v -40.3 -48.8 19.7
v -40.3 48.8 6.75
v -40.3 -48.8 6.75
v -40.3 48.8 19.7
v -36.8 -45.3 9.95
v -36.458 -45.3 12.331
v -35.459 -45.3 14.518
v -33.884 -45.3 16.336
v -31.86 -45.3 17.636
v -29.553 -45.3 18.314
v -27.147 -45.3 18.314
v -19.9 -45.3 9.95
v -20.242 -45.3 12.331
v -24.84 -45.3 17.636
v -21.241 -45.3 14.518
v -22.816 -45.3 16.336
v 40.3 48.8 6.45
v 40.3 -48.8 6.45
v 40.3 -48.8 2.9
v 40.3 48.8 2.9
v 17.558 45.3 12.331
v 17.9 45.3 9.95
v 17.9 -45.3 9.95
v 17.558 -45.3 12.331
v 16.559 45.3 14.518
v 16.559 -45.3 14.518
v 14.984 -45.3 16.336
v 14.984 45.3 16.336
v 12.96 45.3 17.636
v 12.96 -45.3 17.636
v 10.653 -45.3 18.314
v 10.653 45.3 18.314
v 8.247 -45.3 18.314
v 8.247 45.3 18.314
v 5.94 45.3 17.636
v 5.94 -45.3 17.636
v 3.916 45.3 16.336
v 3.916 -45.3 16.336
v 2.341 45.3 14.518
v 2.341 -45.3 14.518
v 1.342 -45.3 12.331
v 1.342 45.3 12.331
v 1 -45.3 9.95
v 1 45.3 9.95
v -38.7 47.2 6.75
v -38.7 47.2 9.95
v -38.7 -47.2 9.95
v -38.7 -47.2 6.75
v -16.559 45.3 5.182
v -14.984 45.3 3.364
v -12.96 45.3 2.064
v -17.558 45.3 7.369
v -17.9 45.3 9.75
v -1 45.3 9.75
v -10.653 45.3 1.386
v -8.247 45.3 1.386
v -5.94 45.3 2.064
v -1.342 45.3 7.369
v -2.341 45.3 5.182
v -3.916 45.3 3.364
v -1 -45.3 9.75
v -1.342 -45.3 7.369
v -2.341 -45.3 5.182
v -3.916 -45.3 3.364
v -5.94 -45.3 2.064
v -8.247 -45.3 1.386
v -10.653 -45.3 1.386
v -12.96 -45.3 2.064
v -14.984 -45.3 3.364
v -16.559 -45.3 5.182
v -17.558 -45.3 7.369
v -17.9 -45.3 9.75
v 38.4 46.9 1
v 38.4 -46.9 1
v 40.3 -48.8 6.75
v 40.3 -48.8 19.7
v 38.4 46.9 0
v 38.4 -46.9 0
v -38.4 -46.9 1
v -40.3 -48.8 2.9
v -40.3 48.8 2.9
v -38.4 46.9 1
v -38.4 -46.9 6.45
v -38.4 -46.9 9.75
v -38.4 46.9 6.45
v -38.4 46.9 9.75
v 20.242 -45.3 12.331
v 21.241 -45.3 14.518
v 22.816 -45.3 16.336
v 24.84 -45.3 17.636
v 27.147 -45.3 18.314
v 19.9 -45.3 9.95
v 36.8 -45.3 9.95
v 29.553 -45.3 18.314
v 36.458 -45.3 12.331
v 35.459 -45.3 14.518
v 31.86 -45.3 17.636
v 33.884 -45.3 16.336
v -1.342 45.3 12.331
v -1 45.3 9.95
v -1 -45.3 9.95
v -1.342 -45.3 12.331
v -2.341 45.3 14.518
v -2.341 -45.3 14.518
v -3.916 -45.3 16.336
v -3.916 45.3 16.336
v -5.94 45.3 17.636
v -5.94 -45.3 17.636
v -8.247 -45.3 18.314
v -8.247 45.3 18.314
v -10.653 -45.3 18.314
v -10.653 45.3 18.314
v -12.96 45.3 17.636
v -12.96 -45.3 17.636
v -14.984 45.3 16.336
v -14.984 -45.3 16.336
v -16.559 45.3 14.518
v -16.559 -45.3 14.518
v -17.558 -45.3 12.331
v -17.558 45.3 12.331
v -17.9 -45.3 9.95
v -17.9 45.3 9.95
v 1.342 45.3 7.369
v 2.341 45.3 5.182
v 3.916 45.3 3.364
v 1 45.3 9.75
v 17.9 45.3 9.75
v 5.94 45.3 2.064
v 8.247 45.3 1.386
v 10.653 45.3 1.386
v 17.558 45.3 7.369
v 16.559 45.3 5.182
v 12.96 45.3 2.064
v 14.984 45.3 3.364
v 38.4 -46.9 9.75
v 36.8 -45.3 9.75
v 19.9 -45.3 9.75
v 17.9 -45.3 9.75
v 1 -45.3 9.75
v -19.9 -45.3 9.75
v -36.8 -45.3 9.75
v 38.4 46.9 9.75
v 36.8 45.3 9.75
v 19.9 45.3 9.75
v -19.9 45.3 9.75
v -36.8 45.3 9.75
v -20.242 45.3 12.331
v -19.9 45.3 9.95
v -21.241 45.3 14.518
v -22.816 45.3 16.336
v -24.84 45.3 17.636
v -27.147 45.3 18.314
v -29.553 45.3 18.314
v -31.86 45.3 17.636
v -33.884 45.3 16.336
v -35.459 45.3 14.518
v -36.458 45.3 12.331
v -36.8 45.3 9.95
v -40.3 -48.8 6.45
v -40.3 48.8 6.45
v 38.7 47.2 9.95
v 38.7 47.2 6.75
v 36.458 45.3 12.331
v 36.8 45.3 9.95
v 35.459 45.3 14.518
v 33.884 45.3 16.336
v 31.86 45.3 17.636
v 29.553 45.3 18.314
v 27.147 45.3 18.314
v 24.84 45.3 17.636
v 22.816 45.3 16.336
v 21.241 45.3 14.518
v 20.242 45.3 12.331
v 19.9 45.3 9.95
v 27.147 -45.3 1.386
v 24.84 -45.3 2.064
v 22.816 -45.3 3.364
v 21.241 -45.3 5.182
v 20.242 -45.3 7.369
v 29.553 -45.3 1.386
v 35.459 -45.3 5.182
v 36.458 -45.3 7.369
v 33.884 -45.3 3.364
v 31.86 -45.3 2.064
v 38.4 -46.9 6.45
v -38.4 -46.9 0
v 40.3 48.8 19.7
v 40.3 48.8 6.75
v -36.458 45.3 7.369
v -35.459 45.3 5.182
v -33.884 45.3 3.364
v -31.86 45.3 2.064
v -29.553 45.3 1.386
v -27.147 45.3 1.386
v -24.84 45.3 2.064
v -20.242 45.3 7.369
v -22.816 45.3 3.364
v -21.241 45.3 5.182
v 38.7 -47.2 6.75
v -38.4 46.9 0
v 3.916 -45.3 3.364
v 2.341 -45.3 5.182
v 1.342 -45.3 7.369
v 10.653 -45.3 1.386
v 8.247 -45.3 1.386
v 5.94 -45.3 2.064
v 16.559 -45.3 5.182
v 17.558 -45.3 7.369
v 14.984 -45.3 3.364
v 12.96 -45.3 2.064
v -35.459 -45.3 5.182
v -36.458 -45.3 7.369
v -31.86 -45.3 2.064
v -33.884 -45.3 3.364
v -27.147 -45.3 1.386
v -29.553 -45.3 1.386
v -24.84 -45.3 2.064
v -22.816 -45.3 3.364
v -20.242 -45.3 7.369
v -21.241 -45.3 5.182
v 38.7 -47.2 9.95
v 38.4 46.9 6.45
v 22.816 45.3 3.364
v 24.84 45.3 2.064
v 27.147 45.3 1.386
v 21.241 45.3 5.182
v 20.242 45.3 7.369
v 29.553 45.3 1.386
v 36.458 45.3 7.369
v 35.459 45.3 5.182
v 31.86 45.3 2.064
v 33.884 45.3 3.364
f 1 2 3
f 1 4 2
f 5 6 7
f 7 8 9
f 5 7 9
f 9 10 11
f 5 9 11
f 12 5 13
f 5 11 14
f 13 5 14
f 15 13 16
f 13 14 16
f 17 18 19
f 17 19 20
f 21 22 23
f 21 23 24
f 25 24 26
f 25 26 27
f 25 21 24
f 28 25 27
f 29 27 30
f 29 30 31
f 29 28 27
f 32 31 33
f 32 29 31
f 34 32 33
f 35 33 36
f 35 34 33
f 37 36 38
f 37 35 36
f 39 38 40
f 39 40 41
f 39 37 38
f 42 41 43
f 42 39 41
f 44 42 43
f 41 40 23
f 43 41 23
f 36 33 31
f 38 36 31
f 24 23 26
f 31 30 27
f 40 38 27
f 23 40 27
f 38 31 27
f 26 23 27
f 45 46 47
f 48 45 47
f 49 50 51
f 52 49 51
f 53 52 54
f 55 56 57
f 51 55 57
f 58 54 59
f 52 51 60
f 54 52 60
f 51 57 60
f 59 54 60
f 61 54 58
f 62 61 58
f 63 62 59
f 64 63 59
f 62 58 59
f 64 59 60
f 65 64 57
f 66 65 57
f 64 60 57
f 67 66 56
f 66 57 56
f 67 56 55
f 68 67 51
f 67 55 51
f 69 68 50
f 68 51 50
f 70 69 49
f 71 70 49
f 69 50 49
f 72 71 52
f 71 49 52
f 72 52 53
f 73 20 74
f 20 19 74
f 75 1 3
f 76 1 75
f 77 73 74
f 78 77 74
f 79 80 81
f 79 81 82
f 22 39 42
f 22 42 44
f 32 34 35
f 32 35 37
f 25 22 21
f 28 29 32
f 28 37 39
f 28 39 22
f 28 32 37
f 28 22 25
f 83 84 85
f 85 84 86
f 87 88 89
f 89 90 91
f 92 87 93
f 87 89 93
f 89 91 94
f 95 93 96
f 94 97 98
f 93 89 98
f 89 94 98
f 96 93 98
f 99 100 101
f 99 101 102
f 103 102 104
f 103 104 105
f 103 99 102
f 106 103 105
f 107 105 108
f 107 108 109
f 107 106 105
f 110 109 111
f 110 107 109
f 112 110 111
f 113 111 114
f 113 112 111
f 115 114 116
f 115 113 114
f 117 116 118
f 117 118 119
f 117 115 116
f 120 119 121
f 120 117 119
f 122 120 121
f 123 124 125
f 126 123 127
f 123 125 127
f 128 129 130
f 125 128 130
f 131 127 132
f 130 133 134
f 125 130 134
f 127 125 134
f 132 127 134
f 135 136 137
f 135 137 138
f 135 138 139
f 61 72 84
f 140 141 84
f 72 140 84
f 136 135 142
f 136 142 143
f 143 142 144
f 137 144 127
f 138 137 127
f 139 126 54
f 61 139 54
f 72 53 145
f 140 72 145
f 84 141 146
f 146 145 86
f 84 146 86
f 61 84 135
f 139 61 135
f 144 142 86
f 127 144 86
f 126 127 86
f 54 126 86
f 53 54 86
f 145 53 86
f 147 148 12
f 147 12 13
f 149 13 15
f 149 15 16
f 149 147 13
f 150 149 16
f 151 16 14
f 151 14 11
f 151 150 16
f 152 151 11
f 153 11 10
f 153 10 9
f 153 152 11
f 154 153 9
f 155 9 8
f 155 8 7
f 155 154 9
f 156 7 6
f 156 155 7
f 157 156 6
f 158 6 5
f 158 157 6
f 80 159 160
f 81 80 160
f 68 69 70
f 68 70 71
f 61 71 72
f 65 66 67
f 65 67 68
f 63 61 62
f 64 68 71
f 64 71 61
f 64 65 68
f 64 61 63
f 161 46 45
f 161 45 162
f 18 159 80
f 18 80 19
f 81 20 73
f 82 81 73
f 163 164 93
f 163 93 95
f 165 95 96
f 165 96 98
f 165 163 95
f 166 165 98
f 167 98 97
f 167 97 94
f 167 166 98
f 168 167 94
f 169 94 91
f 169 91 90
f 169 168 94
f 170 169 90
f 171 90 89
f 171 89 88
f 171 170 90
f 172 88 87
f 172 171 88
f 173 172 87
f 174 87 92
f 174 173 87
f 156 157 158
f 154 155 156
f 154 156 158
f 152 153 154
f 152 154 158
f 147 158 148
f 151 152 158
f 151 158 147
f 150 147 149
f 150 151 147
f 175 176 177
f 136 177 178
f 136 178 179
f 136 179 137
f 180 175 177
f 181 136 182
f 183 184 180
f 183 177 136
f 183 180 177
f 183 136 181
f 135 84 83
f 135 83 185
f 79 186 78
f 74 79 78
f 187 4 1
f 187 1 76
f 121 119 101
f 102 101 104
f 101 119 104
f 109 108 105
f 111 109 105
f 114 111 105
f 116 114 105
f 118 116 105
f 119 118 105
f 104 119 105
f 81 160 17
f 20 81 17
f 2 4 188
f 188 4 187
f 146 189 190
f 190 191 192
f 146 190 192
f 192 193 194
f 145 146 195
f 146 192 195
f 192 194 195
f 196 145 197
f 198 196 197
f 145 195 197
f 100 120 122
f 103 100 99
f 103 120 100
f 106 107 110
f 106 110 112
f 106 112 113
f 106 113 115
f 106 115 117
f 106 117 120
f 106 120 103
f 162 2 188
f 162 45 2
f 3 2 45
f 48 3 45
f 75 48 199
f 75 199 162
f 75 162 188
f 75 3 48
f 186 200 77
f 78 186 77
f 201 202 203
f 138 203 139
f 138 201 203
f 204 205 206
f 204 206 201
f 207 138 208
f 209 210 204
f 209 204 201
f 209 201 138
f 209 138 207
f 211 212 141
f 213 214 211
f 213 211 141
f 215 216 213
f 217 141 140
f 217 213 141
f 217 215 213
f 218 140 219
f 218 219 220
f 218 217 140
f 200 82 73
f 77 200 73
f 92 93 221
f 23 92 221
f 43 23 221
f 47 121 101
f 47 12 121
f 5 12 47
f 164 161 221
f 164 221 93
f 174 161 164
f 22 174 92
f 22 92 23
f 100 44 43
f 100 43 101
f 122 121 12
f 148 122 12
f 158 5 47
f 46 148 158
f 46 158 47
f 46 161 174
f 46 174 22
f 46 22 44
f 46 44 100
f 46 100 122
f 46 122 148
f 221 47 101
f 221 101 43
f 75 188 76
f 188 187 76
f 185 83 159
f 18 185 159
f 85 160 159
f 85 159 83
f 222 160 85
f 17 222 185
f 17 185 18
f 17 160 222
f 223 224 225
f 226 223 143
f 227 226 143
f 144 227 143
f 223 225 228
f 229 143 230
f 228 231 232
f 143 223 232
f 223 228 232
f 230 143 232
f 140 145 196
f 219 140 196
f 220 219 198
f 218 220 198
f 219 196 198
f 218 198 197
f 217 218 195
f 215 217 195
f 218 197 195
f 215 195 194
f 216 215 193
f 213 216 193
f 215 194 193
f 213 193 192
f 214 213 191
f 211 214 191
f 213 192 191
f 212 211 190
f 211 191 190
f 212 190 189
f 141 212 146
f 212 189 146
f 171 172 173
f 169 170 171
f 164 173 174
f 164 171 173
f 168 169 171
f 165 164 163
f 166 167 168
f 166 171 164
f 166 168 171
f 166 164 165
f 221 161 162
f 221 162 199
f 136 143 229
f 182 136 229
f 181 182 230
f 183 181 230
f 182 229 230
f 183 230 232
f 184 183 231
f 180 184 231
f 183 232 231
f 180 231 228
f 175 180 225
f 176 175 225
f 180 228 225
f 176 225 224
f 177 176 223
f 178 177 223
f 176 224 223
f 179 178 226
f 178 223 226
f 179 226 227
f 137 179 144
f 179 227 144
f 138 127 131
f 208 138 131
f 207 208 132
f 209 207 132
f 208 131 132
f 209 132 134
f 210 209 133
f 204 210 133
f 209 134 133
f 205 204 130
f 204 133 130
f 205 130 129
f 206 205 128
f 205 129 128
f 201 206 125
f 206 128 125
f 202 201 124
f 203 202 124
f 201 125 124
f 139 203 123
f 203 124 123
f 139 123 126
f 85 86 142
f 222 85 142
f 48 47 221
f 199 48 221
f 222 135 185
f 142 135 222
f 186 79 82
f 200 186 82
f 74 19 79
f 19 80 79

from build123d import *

# Parameters (mm, degrees)
F3_W          = 80.6
F3_H          = 97.6
F4_DEPTH      = 1
F5_W          = 80.6
F5_H          = 97.6
F5_W_2        = 73.6
F5_H_2        = 90.6
F6_DEPTH      = 8.75
F8_DEPTH      = 90.6
F11_W         = 80.6
F11_H         = 97.6
F11_W_2       = 76.8
F11_H_2       = 93.8
F13_DEPTH     = 3.3
F14_W         = 80.6
F14_H         = 97.6
F14_W_2       = 76.8
F14_H_2       = 93.8
F15_DEPTH     = 3
F16_T4_DEPTH  = 76.8
F16_T9_DEPTH  = 93.8
F16_T14_DEPTH = 76.8
F16_T19_DEPTH = 93.8
F16_T25_DEPTH = 81.9433659759
F16_T31_DEPTH = 98.9433659759
F16_T40_DEPTH = 81.9433659759
F16_T46_DEPTH = 98.9433659759
F16_T55_DEPTH = 81.9433659759
F16_T61_DEPTH = 98.9433659759
F16_T70_DEPTH = 98.9433659759
F16_T76_DEPTH = 81.9433659759
F17_W         = 80.6
F17_H         = 97.6
F17_W_2       = 77.4
F17_H_2       = 94.4
F18_DEPTH     = 3.2


# Not quite as in the source:
# - a fillet or chamfer that OpenCascade refuses, or shapes differently, is made with other operations: its cross-section is extruded or revolved along the edge and cut away or added


with BuildPart() as f4:
    # F3 (on Top) → F4 (new body)
    with BuildSketch(Plane.XY):
        Rectangle(F3_W, F3_H)
    extrude(amount=F4_DEPTH)

    # F5 (on face) → F6 (join)
    with BuildSketch(Plane.XY.offset(1)):
        Rectangle(F5_W, F5_H)
        Rectangle(F5_W_2, F5_H_2, mode=Mode.SUBTRACT)
    extrude(amount=F6_DEPTH)

    # F7 (on face) → F8 (join, through all)
    with BuildSketch(Plane.XZ.offset(-45.3)):
        with BuildLine():
            ThreePointArc((-19.9, 9.75), (-28.35, 1.3), (-36.8, 9.75))
            Line((-36.8, 9.75), (-36.8, 1))
            Line((-36.8, 1), (36.8, 1))
            Line((36.8, 1), (36.8, 9.75))
            ThreePointArc((36.8, 9.75), (28.35, 1.3), (19.9, 9.75))
            Line((19.9, 9.75), (17.9, 9.75))
            ThreePointArc((17.9, 9.75), (9.45, 1.3), (1, 9.75))
            Line((1, 9.75), (-1, 9.75))
            ThreePointArc((-1, 9.75), (-9.45, 1.3), (-17.9, 9.75))
            Line((-17.9, 9.75), (-19.9, 9.75))
        make_face()
    extrude(amount=F8_DEPTH)


with BuildPart() as f10_1:
    # F10: instance of F4
    add(f4.part.mirror(Plane.XY.offset(9.85)))

    # F17 (on face) → F18 (join)
    with BuildSketch(Plane(origin=(0, 0, 9.95), x_dir=(1, 0, 0), z_dir=(0, 0, -1))):
        Rectangle(F17_W, F17_H)
        Rectangle(F17_W_2, F17_H_2, mode=Mode.SUBTRACT)
    extrude(amount=F18_DEPTH)


with BuildPart() as f4_1:
    add(f4.part)

    # F11 (on face) → F13 (cut)
    with BuildSketch(Plane.XY.offset(9.75)):
        Rectangle(F11_W, F11_H)
        Rectangle(F11_W_2, F11_H_2, mode=Mode.SUBTRACT)
    extrude(amount=-F13_DEPTH, mode=Mode.SUBTRACT)

    # F14 (on face) → F15 (cut)
    with BuildSketch(Plane(origin=(0, 0, 0), x_dir=(1, 0, 0), z_dir=(0, 0, -1))):
        Rectangle(F14_W, F14_H)
        Rectangle(F14_W_2, F14_H_2, mode=Mode.SUBTRACT)
    extrude(amount=-F15_DEPTH, mode=Mode.SUBTRACT)

    # F16: chamfer of 2 on 4 edges, made by hand


with BuildPart() as f16_tool2:
    # F16_s3 → F16_t4 (new body)
    with BuildSketch(Plane.YZ.offset(-38.4)):
        Polygon((-48.9, 3), (-46.9, 1), (-46.9, 3), align=None)
    extrude(amount=F16_T4_DEPTH)

    split(bisect_by=Plane.XZ.offset(48.8), keep=Keep.BOTTOM)


with BuildPart() as f4_2:
    add(f4_1.part)

    # F16_t1: union F16_tool2
    add(f16_tool2.part)


with BuildPart() as f16_tool7:
    # F16_s8 → F16_t9 (new body)
    with BuildSketch(Plane.XZ.offset(-46.9)):
        Polygon((-40.4, 3), (-38.4, 1), (-38.4, 3), align=None)
    extrude(amount=F16_T9_DEPTH)

    split(bisect_by=Plane.YZ.offset(-40.3), keep=Keep.TOP)


with BuildPart() as f4_3:
    add(f4_2.part)

    # F16_t6: union F16_tool7
    add(f16_tool7.part)


with BuildPart() as f16_tool12:
    # F16_s13 → F16_t14 (new body)
    with BuildSketch(Plane.YZ.offset(38.4)):
        Polygon((48.9, 3), (46.9, 1), (46.9, 3), align=None)
    extrude(amount=-F16_T14_DEPTH)

    split(bisect_by=Plane.XZ.offset(-48.8), keep=Keep.TOP)


with BuildPart() as f4_4:
    add(f4_3.part)

    # F16_t11: union F16_tool12
    add(f16_tool12.part)


with BuildPart() as f16_tool17:
    # F16_s18 → F16_t19 (new body)
    with BuildSketch(Plane.XZ.offset(46.9)):
        Polygon((40.4, 3), (38.4, 1), (38.4, 3), align=None)
    extrude(amount=-F16_T19_DEPTH)

    split(bisect_by=Plane.YZ.offset(40.3), keep=Keep.BOTTOM)


with BuildPart() as f4_5:
    add(f4_4.part)

    # F16_t16: union F16_tool17
    add(f16_tool17.part)


with BuildPart() as f16_tool23:
    # F16_s24 → F16_t25 (new body)
    with BuildSketch(Plane.YZ.offset(-43.5433659759)):
        Polygon((-48.9, 3), (-46.9, 1), (-46.9, 3), align=None)
    extrude(amount=F16_T25_DEPTH)

    split(bisect_by=Plane.XZ.offset(48.8), keep=Keep.BOTTOM)

    split(bisect_by=Plane.YZ.offset(-40.3), keep=Keep.TOP)

    split(bisect_by=Plane.YZ.offset(-38.4), keep=Keep.BOTTOM)


with BuildPart() as f16_tool29:
    # F16_s30 → F16_t31 (new body)
    with BuildSketch(Plane.XZ.offset(-46.9)):
        Polygon((-40.4, 3), (-38.4, 1), (-38.4, 3), align=None)
    extrude(amount=F16_T31_DEPTH)

    split(bisect_by=Plane.XZ.offset(48.8), keep=Keep.BOTTOM)

    split(bisect_by=Plane.YZ.offset(-40.3), keep=Keep.TOP)

    split(bisect_by=Plane.XZ.offset(46.9), keep=Keep.TOP)


with BuildPart() as f16_tool23_1:
    add(f16_tool23.part)

    # F16_t35: intersect F16_tool29
    add(f16_tool29.part, mode=Mode.INTERSECT)


with BuildPart() as f4_6:
    add(f4_5.part)

    # F16_t21: union F16_tool23
    add(f16_tool23_1.part)


with BuildPart() as f16_tool38:
    # F16_s39 → F16_t40 (new body)
    with BuildSketch(Plane.YZ.offset(-38.4)):
        Polygon((-48.9, 3), (-46.9, 1), (-46.9, 3), align=None)
    extrude(amount=F16_T40_DEPTH)

    split(bisect_by=Plane.XZ.offset(48.8), keep=Keep.BOTTOM)

    split(bisect_by=Plane.YZ.offset(40.3), keep=Keep.BOTTOM)

    split(bisect_by=Plane.YZ.offset(38.4), keep=Keep.TOP)


with BuildPart() as f16_tool44:
    # F16_s45 → F16_t46 (new body)
    with BuildSketch(Plane.XZ.offset(52.0433659759)):
        Polygon((40.4, 3), (38.4, 1), (38.4, 3), align=None)
    extrude(amount=-F16_T46_DEPTH)

    split(bisect_by=Plane.XZ.offset(48.8), keep=Keep.BOTTOM)

    split(bisect_by=Plane.YZ.offset(40.3), keep=Keep.BOTTOM)

    split(bisect_by=Plane.XZ.offset(46.9), keep=Keep.TOP)


with BuildPart() as f16_tool38_1:
    add(f16_tool38.part)

    # F16_t50: intersect F16_tool44
    add(f16_tool44.part, mode=Mode.INTERSECT)


with BuildPart() as f4_7:
    add(f4_6.part)

    # F16_t36: union F16_tool38
    add(f16_tool38_1.part)


with BuildPart() as f16_tool53:
    # F16_s54 → F16_t55 (new body)
    with BuildSketch(Plane.YZ.offset(38.4)):
        Polygon((48.9, 3), (46.9, 1), (46.9, 3), align=None)
    extrude(amount=-F16_T55_DEPTH)

    split(bisect_by=Plane.YZ.offset(-40.3), keep=Keep.TOP)

    split(bisect_by=Plane.XZ.offset(-48.8), keep=Keep.TOP)

    split(bisect_by=Plane.YZ.offset(-38.4), keep=Keep.BOTTOM)


with BuildPart() as f16_tool59:
    # F16_s60 → F16_t61 (new body)
    with BuildSketch(Plane.XZ.offset(-52.0433659759)):
        Polygon((-40.4, 3), (-38.4, 1), (-38.4, 3), align=None)
    extrude(amount=F16_T61_DEPTH)

    split(bisect_by=Plane.YZ.offset(-40.3), keep=Keep.TOP)

    split(bisect_by=Plane.XZ.offset(-48.8), keep=Keep.TOP)

    split(bisect_by=Plane.XZ.offset(-46.9), keep=Keep.BOTTOM)


with BuildPart() as f16_tool53_1:
    add(f16_tool53.part)

    # F16_t65: intersect F16_tool59
    add(f16_tool59.part, mode=Mode.INTERSECT)


with BuildPart() as f4_8:
    add(f4_7.part)

    # F16_t51: union F16_tool53
    add(f16_tool53_1.part)


with BuildPart() as f16_tool68:
    # F16_s69 → F16_t70 (new body)
    with BuildSketch(Plane.XZ.offset(46.9)):
        Polygon((40.4, 3), (38.4, 1), (38.4, 3), align=None)
    extrude(amount=-F16_T70_DEPTH)

    split(bisect_by=Plane.YZ.offset(40.3), keep=Keep.BOTTOM)

    split(bisect_by=Plane.XZ.offset(-48.8), keep=Keep.TOP)

    split(bisect_by=Plane.XZ.offset(-46.9), keep=Keep.BOTTOM)


with BuildPart() as f16_tool74:
    # F16_s75 → F16_t76 (new body)
    with BuildSketch(Plane.YZ.offset(43.5433659759)):
        Polygon((48.9, 3), (46.9, 1), (46.9, 3), align=None)
    extrude(amount=-F16_T76_DEPTH)

    split(bisect_by=Plane.YZ.offset(40.3), keep=Keep.BOTTOM)

    split(bisect_by=Plane.XZ.offset(-48.8), keep=Keep.TOP)

    split(bisect_by=Plane.YZ.offset(38.4), keep=Keep.TOP)


with BuildPart() as f16_tool68_1:
    add(f16_tool68.part)

    # F16_t80: intersect F16_tool74
    add(f16_tool74.part, mode=Mode.INTERSECT)


with BuildPart() as f4_9:
    add(f4_8.part)

    # F16_t66: union F16_tool68
    add(f16_tool68_1.part)


solid = Compound([f10_1.part, f4_9.part])
